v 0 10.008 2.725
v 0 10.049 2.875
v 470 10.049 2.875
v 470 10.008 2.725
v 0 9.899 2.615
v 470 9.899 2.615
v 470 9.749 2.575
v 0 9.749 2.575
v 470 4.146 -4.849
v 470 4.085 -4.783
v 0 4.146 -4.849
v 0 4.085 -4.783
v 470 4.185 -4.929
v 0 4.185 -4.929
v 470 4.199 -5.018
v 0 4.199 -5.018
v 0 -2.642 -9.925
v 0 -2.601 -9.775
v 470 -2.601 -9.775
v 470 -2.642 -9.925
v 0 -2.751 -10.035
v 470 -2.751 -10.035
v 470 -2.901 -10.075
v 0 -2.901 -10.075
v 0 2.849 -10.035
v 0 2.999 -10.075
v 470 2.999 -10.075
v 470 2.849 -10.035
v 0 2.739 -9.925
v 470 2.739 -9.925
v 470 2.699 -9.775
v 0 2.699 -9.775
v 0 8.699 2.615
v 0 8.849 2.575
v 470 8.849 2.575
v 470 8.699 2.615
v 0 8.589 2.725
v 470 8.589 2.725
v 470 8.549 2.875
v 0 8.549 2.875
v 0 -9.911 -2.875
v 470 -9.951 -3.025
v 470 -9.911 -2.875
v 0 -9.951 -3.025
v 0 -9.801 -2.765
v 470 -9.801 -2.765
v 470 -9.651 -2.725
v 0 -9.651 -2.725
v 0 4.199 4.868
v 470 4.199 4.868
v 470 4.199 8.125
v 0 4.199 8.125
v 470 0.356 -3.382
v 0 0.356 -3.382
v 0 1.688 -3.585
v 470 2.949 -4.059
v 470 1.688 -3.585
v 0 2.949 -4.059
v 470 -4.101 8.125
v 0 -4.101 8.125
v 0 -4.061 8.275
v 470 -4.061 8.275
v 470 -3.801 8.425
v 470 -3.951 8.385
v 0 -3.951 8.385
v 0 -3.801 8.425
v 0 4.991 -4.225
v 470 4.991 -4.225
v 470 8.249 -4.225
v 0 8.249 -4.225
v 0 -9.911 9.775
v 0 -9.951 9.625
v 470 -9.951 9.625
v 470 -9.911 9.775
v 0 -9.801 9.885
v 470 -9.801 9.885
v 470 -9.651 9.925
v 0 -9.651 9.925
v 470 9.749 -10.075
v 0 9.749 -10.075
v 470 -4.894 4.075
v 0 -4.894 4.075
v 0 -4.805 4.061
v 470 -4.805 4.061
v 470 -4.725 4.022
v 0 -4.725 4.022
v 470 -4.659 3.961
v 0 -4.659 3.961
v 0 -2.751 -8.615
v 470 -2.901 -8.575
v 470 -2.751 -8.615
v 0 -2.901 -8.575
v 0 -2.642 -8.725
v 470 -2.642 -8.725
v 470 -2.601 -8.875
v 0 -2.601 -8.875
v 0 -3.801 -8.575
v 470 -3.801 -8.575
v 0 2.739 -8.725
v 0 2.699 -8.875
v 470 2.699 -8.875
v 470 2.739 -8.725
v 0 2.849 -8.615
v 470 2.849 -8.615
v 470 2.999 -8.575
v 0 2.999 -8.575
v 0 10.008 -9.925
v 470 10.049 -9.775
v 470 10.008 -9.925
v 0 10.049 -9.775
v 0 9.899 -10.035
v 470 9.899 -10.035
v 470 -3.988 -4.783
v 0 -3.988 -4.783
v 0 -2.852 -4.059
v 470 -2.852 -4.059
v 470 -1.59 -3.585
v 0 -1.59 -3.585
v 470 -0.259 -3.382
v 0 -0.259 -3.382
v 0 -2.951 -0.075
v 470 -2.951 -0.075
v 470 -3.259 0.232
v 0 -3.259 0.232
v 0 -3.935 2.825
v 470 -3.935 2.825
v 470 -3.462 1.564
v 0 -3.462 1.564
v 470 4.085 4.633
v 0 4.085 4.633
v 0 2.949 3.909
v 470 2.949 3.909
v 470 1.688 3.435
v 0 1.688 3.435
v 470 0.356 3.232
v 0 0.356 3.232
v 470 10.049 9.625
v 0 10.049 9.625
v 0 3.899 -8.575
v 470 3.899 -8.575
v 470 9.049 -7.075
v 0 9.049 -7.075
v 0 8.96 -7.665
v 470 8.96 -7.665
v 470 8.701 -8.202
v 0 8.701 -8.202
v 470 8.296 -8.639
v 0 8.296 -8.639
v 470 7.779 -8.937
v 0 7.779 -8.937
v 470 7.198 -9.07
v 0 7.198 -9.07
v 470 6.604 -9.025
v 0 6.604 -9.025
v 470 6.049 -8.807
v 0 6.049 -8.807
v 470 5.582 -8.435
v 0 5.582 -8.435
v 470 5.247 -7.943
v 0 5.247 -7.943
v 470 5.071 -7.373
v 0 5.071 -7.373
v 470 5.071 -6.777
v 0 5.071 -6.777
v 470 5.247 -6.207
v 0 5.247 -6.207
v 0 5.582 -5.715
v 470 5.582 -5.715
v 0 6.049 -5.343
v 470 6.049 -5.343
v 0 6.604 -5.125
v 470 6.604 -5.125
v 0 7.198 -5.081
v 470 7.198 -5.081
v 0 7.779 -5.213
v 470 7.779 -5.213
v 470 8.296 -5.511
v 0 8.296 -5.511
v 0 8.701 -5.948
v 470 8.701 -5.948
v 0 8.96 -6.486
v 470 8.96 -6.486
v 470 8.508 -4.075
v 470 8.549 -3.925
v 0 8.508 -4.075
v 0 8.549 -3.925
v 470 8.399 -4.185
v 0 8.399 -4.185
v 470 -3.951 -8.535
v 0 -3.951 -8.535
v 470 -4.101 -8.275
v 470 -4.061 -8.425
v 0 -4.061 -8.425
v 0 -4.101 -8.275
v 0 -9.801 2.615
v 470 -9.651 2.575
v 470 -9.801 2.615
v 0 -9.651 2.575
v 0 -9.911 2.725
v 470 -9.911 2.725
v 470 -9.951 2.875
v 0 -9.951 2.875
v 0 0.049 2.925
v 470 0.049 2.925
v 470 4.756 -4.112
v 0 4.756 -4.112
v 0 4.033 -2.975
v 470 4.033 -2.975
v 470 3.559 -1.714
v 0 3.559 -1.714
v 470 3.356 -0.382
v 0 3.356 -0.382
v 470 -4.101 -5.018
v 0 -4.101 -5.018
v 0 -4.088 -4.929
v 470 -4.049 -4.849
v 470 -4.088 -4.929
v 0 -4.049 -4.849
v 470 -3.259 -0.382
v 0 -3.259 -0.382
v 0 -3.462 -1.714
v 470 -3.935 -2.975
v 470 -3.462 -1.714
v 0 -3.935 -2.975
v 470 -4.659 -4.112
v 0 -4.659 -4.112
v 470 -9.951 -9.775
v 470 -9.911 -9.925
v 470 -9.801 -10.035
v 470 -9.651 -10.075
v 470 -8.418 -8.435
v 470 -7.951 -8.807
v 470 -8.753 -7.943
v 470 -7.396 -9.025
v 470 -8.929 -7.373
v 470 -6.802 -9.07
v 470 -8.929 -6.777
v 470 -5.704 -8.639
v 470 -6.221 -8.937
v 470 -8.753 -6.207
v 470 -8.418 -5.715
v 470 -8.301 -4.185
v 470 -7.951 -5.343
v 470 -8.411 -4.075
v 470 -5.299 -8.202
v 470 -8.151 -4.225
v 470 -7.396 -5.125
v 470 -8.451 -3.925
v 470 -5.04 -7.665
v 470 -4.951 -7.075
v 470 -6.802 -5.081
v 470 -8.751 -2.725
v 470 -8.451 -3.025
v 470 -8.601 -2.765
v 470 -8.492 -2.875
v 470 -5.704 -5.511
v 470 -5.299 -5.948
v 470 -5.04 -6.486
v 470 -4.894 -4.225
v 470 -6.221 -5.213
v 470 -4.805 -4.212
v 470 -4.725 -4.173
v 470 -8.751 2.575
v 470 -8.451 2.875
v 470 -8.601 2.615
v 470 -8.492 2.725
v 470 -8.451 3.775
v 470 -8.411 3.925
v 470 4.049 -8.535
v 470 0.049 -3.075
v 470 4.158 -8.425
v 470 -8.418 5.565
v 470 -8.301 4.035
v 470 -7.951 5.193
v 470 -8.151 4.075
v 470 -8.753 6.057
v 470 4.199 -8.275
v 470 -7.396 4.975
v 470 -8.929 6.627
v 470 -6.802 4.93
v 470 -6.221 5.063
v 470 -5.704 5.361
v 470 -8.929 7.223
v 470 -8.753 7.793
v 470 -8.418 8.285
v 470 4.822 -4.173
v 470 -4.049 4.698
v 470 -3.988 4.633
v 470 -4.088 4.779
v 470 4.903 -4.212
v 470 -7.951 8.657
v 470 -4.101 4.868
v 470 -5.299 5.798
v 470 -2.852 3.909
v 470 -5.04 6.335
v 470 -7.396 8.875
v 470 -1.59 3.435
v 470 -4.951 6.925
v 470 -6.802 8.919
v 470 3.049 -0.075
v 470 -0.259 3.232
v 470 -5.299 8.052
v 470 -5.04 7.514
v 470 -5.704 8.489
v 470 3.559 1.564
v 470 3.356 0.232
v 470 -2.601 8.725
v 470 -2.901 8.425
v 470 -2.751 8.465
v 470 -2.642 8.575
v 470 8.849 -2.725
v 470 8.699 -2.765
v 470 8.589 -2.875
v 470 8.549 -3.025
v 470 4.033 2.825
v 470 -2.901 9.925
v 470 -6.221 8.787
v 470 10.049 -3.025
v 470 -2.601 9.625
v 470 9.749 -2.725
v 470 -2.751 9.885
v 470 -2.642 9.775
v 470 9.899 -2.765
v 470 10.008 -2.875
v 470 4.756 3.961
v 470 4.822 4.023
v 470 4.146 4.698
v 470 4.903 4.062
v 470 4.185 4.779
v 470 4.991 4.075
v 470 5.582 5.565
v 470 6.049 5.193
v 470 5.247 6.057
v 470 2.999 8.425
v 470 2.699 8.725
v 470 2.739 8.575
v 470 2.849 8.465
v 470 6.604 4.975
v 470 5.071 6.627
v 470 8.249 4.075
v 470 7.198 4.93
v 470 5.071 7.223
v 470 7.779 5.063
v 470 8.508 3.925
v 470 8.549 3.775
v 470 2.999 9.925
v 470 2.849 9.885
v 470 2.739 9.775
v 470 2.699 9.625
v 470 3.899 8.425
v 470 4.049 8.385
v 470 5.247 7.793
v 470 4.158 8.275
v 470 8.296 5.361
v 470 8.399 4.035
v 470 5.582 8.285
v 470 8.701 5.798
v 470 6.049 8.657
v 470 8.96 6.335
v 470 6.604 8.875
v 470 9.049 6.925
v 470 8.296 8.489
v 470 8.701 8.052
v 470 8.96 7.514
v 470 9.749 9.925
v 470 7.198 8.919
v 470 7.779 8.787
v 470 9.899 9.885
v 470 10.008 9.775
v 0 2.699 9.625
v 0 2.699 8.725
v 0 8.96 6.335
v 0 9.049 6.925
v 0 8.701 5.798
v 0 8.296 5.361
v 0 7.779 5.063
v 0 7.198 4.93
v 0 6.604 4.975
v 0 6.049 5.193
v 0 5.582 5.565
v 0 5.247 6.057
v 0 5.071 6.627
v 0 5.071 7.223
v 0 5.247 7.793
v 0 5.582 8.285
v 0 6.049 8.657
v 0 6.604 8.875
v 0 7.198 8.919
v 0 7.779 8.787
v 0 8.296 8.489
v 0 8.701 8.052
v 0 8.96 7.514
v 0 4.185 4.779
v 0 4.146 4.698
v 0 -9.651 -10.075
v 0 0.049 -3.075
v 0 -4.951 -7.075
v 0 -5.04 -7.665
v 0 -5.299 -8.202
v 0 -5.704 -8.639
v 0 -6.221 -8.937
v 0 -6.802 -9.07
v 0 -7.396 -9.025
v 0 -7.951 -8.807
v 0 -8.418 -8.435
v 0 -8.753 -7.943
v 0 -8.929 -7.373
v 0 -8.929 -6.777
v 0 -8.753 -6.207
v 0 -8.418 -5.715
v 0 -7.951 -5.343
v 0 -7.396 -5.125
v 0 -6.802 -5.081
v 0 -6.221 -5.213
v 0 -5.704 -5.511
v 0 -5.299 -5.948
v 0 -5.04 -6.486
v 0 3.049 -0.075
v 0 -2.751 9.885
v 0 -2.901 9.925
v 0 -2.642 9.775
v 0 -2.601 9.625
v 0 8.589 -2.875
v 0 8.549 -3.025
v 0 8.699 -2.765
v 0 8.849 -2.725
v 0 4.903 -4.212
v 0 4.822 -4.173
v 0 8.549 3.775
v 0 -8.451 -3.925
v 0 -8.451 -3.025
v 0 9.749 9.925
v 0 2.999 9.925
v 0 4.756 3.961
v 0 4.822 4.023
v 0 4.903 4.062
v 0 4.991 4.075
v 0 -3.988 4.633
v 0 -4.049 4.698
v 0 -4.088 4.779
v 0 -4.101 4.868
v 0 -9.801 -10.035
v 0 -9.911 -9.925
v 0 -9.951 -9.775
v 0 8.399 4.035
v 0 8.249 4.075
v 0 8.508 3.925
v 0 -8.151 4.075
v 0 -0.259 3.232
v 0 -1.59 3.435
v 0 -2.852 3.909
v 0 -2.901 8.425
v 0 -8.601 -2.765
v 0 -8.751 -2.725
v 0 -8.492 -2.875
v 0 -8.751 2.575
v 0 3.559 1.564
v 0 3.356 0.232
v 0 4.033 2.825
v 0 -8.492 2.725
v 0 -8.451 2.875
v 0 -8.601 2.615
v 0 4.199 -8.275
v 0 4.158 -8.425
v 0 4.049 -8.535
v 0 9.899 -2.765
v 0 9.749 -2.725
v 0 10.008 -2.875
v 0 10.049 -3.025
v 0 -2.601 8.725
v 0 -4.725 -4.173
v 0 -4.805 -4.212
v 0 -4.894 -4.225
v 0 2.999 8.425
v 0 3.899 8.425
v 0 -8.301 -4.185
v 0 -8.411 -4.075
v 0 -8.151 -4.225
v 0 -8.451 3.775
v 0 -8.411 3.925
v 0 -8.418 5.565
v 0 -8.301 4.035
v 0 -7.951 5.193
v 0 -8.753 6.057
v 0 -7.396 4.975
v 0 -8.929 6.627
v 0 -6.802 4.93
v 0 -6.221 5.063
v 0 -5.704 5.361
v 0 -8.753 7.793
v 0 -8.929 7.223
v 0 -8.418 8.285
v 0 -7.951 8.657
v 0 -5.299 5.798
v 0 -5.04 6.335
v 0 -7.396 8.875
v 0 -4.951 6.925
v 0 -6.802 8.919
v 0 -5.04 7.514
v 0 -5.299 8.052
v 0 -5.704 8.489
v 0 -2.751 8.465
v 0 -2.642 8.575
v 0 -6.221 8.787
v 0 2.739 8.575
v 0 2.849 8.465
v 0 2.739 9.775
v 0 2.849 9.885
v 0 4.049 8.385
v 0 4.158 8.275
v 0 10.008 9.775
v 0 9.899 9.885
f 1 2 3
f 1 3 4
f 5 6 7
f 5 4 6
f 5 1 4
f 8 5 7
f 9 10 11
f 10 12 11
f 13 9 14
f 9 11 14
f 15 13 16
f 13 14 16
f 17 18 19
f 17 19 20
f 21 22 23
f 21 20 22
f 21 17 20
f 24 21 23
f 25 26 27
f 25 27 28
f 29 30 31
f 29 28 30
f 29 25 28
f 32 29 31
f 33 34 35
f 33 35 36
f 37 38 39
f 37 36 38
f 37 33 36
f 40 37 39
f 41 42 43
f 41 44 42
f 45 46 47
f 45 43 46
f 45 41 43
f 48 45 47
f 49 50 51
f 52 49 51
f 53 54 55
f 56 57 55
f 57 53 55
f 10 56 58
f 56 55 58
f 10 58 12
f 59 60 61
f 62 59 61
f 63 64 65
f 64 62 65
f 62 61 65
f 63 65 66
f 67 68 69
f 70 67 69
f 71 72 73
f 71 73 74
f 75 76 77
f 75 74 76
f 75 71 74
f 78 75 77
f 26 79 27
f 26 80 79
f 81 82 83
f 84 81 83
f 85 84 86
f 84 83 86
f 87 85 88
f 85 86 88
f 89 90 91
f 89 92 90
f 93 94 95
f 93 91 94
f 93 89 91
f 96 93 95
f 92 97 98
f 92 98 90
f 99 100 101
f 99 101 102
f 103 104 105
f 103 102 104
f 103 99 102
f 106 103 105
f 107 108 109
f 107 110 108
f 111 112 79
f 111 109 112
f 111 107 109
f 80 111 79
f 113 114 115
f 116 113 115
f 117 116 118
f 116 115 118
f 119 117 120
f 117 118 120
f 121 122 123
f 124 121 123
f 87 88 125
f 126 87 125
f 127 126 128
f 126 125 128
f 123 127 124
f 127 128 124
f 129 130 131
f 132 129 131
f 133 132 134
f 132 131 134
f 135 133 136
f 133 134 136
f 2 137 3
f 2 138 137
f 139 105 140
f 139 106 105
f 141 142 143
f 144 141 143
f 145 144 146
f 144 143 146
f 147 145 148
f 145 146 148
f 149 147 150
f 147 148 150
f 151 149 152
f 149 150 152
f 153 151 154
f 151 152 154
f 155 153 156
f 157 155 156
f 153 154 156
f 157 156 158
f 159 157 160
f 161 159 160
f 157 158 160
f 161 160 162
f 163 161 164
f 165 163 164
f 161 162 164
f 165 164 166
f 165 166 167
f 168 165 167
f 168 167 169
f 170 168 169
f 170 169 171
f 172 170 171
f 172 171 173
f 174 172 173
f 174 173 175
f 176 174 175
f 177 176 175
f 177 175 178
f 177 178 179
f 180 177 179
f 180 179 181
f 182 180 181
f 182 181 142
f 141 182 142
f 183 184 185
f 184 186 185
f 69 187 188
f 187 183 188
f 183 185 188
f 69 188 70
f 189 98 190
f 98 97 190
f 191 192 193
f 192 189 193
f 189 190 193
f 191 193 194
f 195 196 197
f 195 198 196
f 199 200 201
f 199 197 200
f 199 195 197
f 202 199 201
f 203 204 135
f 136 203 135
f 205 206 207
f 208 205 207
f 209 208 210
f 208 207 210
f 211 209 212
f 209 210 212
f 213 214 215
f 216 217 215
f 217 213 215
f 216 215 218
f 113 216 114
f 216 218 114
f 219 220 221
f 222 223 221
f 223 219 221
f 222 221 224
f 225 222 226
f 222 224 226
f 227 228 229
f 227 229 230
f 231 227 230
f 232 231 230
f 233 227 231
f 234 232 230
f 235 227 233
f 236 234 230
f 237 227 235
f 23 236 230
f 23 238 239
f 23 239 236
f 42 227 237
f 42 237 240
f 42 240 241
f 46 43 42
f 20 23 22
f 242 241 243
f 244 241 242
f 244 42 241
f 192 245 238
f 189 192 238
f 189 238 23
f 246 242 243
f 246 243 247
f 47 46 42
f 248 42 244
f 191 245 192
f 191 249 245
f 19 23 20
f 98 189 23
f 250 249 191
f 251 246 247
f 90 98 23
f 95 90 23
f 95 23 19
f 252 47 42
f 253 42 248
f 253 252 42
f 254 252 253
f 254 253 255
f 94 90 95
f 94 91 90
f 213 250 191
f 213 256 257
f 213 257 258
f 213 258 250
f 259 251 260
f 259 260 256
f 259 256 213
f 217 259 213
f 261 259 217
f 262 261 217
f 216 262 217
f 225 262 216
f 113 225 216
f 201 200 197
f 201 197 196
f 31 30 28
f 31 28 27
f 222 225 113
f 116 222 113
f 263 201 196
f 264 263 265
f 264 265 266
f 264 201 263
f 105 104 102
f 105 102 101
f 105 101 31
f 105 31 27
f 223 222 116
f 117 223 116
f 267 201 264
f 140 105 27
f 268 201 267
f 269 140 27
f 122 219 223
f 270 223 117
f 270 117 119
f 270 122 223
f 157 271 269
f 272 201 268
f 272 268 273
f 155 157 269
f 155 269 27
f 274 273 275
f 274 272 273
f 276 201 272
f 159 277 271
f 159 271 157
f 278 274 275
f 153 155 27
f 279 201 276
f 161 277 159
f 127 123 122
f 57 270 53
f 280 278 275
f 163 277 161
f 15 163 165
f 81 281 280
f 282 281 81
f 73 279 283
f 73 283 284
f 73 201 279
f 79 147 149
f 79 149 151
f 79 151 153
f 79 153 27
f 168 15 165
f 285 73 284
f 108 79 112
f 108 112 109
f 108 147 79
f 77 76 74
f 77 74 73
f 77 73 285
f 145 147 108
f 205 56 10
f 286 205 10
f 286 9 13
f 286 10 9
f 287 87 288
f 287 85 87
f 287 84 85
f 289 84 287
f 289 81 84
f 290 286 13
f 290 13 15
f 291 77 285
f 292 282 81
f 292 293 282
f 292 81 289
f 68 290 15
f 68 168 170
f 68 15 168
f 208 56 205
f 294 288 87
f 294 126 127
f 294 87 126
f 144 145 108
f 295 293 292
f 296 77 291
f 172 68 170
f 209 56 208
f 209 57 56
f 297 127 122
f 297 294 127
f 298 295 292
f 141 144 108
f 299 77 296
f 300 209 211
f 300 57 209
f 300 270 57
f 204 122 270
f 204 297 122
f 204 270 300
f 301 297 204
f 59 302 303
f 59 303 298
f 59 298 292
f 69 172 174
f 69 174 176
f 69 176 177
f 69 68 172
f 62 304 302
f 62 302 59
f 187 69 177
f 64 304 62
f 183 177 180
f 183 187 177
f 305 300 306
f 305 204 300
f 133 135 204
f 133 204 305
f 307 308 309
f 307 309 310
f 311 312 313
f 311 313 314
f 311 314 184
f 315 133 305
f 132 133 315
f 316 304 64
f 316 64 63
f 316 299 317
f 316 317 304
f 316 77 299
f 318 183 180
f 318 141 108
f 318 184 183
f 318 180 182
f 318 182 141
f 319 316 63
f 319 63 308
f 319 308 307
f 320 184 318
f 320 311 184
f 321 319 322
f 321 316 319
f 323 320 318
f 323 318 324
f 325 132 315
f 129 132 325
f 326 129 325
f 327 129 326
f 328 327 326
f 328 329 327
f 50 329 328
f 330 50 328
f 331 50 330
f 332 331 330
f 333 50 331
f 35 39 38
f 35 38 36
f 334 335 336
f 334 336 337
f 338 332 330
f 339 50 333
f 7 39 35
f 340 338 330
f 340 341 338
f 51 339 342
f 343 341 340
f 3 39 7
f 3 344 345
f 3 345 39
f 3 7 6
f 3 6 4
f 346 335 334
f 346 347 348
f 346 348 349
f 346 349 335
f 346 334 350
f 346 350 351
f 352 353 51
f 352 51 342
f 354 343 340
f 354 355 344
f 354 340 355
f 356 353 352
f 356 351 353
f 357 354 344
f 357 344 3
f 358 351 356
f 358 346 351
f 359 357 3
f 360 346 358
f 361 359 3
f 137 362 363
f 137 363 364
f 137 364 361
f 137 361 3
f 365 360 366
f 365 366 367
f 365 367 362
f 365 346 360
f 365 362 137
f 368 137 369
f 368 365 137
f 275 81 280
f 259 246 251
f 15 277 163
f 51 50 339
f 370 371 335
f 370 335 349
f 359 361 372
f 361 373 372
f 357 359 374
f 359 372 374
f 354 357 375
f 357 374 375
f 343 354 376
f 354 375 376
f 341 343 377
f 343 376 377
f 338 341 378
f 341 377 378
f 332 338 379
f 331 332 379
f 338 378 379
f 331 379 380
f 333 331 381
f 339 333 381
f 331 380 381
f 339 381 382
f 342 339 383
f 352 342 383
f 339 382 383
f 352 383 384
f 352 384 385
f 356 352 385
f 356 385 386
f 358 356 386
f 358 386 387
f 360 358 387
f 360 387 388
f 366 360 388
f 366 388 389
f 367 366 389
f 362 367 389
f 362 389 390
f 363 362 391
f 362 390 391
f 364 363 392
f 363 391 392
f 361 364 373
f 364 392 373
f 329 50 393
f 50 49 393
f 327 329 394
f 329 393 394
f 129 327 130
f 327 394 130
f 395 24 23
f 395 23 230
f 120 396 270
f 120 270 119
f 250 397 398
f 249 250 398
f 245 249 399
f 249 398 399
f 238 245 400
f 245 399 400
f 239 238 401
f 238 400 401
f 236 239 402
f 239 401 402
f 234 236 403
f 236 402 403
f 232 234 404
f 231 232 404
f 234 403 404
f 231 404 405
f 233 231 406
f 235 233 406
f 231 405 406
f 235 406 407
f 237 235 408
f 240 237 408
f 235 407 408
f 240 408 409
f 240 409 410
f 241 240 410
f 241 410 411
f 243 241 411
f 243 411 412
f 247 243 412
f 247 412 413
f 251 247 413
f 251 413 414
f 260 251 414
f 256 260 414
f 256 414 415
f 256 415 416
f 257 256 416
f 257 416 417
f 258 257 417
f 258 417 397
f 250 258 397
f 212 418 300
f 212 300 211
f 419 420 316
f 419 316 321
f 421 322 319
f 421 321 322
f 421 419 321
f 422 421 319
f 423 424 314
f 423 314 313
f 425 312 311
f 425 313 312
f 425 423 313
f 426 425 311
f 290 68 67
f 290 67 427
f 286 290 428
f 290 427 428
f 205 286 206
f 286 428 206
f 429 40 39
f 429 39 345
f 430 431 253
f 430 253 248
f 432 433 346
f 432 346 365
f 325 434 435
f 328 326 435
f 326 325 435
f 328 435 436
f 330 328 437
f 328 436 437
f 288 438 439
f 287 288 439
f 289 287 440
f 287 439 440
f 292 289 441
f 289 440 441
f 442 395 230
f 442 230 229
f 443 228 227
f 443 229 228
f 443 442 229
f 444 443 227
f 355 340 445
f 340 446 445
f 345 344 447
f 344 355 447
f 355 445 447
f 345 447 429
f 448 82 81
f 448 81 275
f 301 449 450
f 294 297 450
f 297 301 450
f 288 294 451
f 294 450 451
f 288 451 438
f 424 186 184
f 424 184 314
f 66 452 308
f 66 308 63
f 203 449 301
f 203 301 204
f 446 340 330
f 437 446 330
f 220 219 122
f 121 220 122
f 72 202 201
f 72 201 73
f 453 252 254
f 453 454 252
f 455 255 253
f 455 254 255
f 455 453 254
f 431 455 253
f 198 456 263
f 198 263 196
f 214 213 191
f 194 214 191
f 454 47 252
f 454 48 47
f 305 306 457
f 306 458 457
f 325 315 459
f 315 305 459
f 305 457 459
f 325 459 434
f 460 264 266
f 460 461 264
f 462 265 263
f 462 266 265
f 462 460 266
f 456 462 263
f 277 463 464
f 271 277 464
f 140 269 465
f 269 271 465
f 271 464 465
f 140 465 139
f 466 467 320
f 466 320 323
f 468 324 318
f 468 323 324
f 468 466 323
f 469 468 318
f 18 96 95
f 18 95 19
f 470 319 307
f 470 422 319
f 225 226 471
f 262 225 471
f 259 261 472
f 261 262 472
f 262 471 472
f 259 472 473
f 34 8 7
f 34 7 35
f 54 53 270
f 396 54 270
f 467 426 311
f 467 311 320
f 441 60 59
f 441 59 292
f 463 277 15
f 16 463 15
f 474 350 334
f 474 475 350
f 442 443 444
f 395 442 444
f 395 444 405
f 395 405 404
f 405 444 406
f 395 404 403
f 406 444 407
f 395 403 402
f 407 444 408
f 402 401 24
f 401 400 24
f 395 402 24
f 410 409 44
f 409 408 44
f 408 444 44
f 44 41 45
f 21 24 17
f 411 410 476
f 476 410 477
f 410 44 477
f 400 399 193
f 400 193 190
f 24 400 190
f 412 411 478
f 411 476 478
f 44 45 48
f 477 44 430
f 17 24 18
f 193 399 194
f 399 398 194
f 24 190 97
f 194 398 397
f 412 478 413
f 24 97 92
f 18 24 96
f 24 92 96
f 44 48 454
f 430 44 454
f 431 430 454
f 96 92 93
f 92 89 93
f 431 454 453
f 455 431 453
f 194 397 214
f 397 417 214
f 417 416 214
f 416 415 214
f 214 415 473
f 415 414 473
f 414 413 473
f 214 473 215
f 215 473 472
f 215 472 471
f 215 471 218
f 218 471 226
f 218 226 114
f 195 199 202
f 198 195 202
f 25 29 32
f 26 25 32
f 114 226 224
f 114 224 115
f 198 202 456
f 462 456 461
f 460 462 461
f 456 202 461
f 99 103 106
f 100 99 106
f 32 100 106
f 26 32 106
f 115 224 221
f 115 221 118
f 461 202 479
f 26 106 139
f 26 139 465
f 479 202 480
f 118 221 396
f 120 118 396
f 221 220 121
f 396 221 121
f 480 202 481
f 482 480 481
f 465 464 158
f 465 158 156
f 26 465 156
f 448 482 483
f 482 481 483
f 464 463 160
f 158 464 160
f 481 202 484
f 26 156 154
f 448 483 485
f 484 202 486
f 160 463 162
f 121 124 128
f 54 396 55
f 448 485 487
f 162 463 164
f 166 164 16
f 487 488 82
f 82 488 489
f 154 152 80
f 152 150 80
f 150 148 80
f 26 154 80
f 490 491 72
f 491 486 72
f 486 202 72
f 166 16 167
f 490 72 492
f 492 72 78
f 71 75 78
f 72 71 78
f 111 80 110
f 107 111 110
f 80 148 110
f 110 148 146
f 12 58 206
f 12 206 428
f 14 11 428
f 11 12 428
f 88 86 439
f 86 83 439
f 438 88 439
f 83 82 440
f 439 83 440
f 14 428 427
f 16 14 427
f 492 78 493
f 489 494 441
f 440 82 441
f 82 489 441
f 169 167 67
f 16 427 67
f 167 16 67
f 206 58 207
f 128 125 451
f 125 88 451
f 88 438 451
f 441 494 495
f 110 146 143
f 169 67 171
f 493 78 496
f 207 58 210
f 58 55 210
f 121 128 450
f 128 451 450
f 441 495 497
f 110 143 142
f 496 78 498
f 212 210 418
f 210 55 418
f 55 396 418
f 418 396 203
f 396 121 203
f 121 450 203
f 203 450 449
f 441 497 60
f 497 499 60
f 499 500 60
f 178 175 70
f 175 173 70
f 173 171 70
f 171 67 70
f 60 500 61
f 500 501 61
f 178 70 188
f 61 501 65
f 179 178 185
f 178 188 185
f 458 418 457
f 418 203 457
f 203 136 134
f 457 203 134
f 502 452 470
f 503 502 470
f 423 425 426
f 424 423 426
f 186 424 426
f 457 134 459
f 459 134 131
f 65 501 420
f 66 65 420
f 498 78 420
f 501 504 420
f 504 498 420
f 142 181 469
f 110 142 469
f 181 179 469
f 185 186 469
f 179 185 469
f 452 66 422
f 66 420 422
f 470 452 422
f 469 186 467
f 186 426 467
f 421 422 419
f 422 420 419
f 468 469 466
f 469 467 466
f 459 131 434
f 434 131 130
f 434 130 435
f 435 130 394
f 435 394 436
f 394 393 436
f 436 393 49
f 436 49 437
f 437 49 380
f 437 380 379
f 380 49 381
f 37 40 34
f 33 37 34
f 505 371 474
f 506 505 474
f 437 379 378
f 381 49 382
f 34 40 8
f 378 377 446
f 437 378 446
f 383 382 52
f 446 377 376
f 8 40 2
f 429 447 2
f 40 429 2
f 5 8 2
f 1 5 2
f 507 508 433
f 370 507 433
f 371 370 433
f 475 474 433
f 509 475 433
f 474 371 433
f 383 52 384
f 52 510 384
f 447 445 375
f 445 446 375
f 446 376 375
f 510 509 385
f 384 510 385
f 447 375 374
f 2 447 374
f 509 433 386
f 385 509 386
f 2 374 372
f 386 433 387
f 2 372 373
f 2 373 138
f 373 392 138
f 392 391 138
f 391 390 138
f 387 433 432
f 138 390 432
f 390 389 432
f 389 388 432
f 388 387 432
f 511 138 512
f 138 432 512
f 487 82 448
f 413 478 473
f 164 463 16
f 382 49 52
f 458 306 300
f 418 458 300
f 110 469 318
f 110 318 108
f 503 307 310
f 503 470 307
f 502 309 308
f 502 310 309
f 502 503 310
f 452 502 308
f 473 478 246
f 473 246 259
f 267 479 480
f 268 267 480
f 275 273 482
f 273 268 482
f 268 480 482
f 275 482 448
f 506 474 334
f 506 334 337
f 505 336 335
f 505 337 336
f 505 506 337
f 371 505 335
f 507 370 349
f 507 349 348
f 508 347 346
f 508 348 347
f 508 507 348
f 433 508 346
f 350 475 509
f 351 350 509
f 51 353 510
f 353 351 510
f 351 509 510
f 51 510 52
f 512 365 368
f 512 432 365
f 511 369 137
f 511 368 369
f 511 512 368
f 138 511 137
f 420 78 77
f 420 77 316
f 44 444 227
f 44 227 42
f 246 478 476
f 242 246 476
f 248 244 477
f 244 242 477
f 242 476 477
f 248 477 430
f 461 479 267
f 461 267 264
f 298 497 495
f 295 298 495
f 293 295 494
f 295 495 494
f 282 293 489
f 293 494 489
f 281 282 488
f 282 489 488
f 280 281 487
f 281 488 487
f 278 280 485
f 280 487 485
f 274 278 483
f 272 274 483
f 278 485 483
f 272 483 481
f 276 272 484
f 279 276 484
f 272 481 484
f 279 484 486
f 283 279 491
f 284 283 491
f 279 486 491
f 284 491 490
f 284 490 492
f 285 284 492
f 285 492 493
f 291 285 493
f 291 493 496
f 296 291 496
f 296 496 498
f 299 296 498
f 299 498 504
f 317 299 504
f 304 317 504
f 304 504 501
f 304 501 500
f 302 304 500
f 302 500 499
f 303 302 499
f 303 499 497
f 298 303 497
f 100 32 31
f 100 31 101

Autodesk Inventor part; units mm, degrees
ref_plane "YZ Plane" through (0, 0, 0) normal (1, 0, 0) x (0, 1, 0)
ref_plane "XZ Plane" through (0, 0, 0) normal (0, 1, 0) x (-1, 0, 0)
ref_plane "XY Plane" through (0, 0, 0) normal (0, 0, 1) x (1, 0, 0)
sketch "Sketch1" plane through (0, 0, 0) normal (1, 0, 0) x (0, 1, 0)
  line L0 (9.5486, -7.0751) -> (4.5486, -7.0751)
  line L1 (7.0486, -9.5751) -> (7.0486, -4.5751)
  circle A0 centre (7.0486, -7.0751) radius 2
  circle A1 centre (7.0486, 6.9249) radius 2
  line L2 (7.0486, 9.4249) -> (7.0486, 4.4249)
  line L3 (9.5486, 6.9249) -> (4.5486, 6.9249)
  line L4 (4.1986, 4.8676) -> (4.1986, 8.1249)
  arc A2 (4.1986, 8.1249) -> (3.8986, 8.4249) centre (3.8986, 8.1249) ccw
  line L5 (3.8986, 8.4249) -> (2.9986, 8.4249)
  arc A3 (2.6986, 8.7249) -> (2.9986, 8.4249) centre (2.9986, 8.7249) ccw
  line L6 (2.6986, 8.7249) -> (2.6986, 9.6249)
  arc A4 (2.9986, 9.9249) -> (2.6986, 9.6249) centre (2.9986, 9.6249) ccw
  line L7 (2.9986, 9.9249) -> (9.7486, 9.9249)
  arc A5 (10.0486, 9.6249) -> (9.7486, 9.9249) centre (9.7486, 9.6249) ccw
  line L8 (10.0486, 9.6249) -> (10.0486, 2.8749)
  arc A6 (9.7486, 2.5749) -> (10.0486, 2.8749) centre (9.7486, 2.8749) ccw
  line L9 (9.7486, 2.5749) -> (8.8486, 2.5749)
  arc A7 (8.5486, 2.8749) -> (8.8486, 2.5749) centre (8.8486, 2.8749) ccw
  line L10 (8.5486, 2.8749) -> (8.5486, 3.7749)
  arc A8 (8.5486, 3.7749) -> (8.2486, 4.0749) centre (8.2486, 3.7749) ccw
  line L11 (8.2486, 4.0749) -> (4.9914, 4.0749)
  arc A9 (4.9914, 4.0749) -> (4.7564, 3.9614) centre (4.9914, 3.7749) ccw
  arc A10 (4.7564, 3.9614) -> (3.3559, 0.2322) centre (9.8395, -0.0751) ccw
  line L12 (3.3559, 0.2322) -> (3.0486, -0.0751)
  line L13 (3.0486, -0.0751) -> (3.3559, -0.3824)
  arc A11 (3.3559, -0.3824) -> (4.7564, -4.1117) centre (9.8395, -0.0751) ccw
  arc A12 (4.7564, -4.1117) -> (4.9914, -4.2251) centre (4.9914, -3.9251) ccw
  line L14 (4.9914, -4.2251) -> (8.2486, -4.2251)
  arc A13 (8.2486, -4.2251) -> (8.5486, -3.9251) centre (8.2486, -3.9251) ccw
  line L15 (8.5486, -3.9251) -> (8.5486, -3.0251)
  arc A14 (8.8486, -2.7251) -> (8.5486, -3.0251) centre (8.8486, -3.0251) ccw
  line L16 (8.8486, -2.7251) -> (9.7486, -2.7251)
  arc A15 (10.0486, -3.0251) -> (9.7486, -2.7251) centre (9.7486, -3.0251) ccw
  line L17 (10.0486, -3.0251) -> (10.0486, -9.7751)
  arc A16 (9.7486, -10.0751) -> (10.0486, -9.7751) centre (9.7486, -9.7751) ccw
  line L18 (9.7486, -10.0751) -> (2.9986, -10.0751)
  arc A17 (2.6986, -9.7751) -> (2.9986, -10.0751) centre (2.9986, -9.7751) ccw
  line L19 (2.6986, -9.7751) -> (2.6986, -8.8751)
  arc A18 (2.9986, -8.5751) -> (2.6986, -8.8751) centre (2.9986, -8.8751) ccw
  line L20 (2.9986, -8.5751) -> (3.8986, -8.5751)
  arc A19 (3.8986, -8.5751) -> (4.1986, -8.2751) centre (3.8986, -8.2751) ccw
  line L21 (4.1986, -8.2751) -> (4.1986, -5.0179)
  arc A20 (4.1986, -5.0179) -> (4.0852, -4.7829) centre (3.8986, -5.0179) ccw
  arc A21 (4.0852, -4.7829) -> (0.3559, -3.3824) centre (0.0486, -9.8659) ccw
  line L22 (0.3559, -3.3824) -> (0.0486, -3.0751)
  line L23 (0.0486, -3.0751) -> (-0.2587, -3.3824)
  arc A22 (-0.2587, -3.3824) -> (-3.9879, -4.7829) centre (0.0486, -9.8659) ccw
  arc A23 (-3.9879, -4.7829) -> (-4.1014, -5.0179) centre (-3.8014, -5.0179) ccw
  line L24 (-4.1014, -5.0179) -> (-4.1014, -8.2751)
  arc A24 (-4.1014, -8.2751) -> (-3.8014, -8.5751) centre (-3.8014, -8.2751) ccw
  line L25 (-3.8014, -8.5751) -> (-2.9014, -8.5751)
  arc A25 (-2.6014, -8.8751) -> (-2.9014, -8.5751) centre (-2.9014, -8.8751) ccw
  line L26 (-2.6014, -8.8751) -> (-2.6014, -9.7751)
  arc A26 (-2.9014, -10.0751) -> (-2.6014, -9.7751) centre (-2.9014, -9.7751) ccw
  line L27 (-2.9014, -10.0751) -> (-9.6514, -10.0751)
  arc A27 (-9.9514, -9.7751) -> (-9.6514, -10.0751) centre (-9.6514, -9.7751) ccw
  line L28 (-9.9514, -9.7751) -> (-9.9514, -3.0251)
  arc A28 (-9.6514, -2.7251) -> (-9.9514, -3.0251) centre (-9.6514, -3.0251) ccw
  line L29 (-9.6514, -2.7251) -> (-8.7514, -2.7251)
  arc A29 (-8.4514, -3.0251) -> (-8.7514, -2.7251) centre (-8.7514, -3.0251) ccw
  line L30 (-8.4514, -3.0251) -> (-8.4514, -3.9251)
  arc A30 (-8.4514, -3.9251) -> (-8.1514, -4.2251) centre (-8.1514, -3.9251) ccw
  line L31 (-8.1514, -4.2251) -> (-4.8941, -4.2251)
  arc A31 (-4.8941, -4.2251) -> (-4.6592, -4.1117) centre (-4.8941, -3.9251) ccw
  arc A32 (-4.6592, -4.1117) -> (-3.2587, -0.3824) centre (-9.7422, -0.0751) ccw
  line L32 (-3.2587, -0.3824) -> (-2.9514, -0.0751)
  line L33 (-2.9514, -0.0751) -> (-3.2587, 0.2322)
  arc A33 (-3.2587, 0.2322) -> (-4.6592, 3.9614) centre (-9.7422, -0.0751) ccw
  arc A34 (-4.6592, 3.9614) -> (-4.8941, 4.0749) centre (-4.8941, 3.7749) ccw
  line L34 (-4.8941, 4.0749) -> (-8.1514, 4.0749)
  arc A35 (-8.1514, 4.0749) -> (-8.4514, 3.7749) centre (-8.1514, 3.7749) ccw
  line L35 (-8.4514, 3.7749) -> (-8.4514, 2.8749)
  arc A36 (-8.7514, 2.5749) -> (-8.4514, 2.8749) centre (-8.7514, 2.8749) ccw
  line L36 (-8.7514, 2.5749) -> (-9.6514, 2.5749)
  arc A37 (-9.9514, 2.8749) -> (-9.6514, 2.5749) centre (-9.6514, 2.8749) ccw
  line L37 (-9.9514, 2.8749) -> (-9.9514, 9.6249)
  arc A38 (-9.6514, 9.9249) -> (-9.9514, 9.6249) centre (-9.6514, 9.6249) ccw
  line L38 (-9.6514, 9.9249) -> (-2.9014, 9.9249)
  arc A39 (-2.6014, 9.6249) -> (-2.9014, 9.9249) centre (-2.9014, 9.6249) ccw
  line L39 (-2.6014, 9.6249) -> (-2.6014, 8.7249)
  arc A40 (-2.9014, 8.4249) -> (-2.6014, 8.7249) centre (-2.9014, 8.7249) ccw
  line L40 (-2.9014, 8.4249) -> (-3.8014, 8.4249)
  arc A41 (-3.8014, 8.4249) -> (-4.1014, 8.1249) centre (-3.8014, 8.1249) ccw
  line L41 (-4.1014, 8.1249) -> (-4.1014, 4.8676)
  arc A42 (-4.1014, 4.8676) -> (-3.9879, 4.6327) centre (-3.8014, 4.8676) ccw
  arc A43 (-3.9879, 4.6327) -> (-0.2587, 3.2322) centre (0.0486, 9.7157) ccw
  line L42 (-0.2587, 3.2322) -> (0.0486, 2.9249)
  line L43 (0.0486, 2.9249) -> (0.3559, 3.2322)
  arc A44 (0.3559, 3.2322) -> (4.0852, 4.6327) centre (0.0486, 9.7157) ccw
  arc A45 (4.0852, 4.6327) -> (4.1986, 4.8676) centre (3.8986, 4.8676) ccw
  line L44 (-11.1503, -0.0751) -> (11.2475, -0.0751)
  circle A46 centre (0.0486, -0.0751) radius 2.15
  circle A47 centre (-6.9514, -7.0751) radius 2
  line L45 (-6.9514, -9.5751) -> (-6.9514, -4.5751)
  line L46 (-9.4514, -7.0751) -> (-4.4514, -7.0751)
  circle A48 centre (-6.9514, 6.9249) radius 2
  line L47 (-6.9514, 9.4249) -> (-6.9514, 4.4249)
  line L48 (-9.4514, 6.9249) -> (-4.4514, 6.9249)
extrude "Extrusion1" add sketch "Sketch1" along normal blind 470
equation "\"BendRadius\" = Thickness"
equation "\"BendReliefWidth\" = Thickness"
equation "\"BendReliefDepth\" = 0.5 * Thickness"
equation "\"CornerReliefSize\" = 4 * Thickness"
equation "\"MinimumRemnant\" = 2 * Thickness"
equation "\"TransitionRadius\" = BendRadius"
equation "\"JacobiRadiusSize\" = BendRadius"
equation "\"GapSize\" = Thickness"
equation "\"Thickness\" = 3.048"
properties part number "600mm 2020"
